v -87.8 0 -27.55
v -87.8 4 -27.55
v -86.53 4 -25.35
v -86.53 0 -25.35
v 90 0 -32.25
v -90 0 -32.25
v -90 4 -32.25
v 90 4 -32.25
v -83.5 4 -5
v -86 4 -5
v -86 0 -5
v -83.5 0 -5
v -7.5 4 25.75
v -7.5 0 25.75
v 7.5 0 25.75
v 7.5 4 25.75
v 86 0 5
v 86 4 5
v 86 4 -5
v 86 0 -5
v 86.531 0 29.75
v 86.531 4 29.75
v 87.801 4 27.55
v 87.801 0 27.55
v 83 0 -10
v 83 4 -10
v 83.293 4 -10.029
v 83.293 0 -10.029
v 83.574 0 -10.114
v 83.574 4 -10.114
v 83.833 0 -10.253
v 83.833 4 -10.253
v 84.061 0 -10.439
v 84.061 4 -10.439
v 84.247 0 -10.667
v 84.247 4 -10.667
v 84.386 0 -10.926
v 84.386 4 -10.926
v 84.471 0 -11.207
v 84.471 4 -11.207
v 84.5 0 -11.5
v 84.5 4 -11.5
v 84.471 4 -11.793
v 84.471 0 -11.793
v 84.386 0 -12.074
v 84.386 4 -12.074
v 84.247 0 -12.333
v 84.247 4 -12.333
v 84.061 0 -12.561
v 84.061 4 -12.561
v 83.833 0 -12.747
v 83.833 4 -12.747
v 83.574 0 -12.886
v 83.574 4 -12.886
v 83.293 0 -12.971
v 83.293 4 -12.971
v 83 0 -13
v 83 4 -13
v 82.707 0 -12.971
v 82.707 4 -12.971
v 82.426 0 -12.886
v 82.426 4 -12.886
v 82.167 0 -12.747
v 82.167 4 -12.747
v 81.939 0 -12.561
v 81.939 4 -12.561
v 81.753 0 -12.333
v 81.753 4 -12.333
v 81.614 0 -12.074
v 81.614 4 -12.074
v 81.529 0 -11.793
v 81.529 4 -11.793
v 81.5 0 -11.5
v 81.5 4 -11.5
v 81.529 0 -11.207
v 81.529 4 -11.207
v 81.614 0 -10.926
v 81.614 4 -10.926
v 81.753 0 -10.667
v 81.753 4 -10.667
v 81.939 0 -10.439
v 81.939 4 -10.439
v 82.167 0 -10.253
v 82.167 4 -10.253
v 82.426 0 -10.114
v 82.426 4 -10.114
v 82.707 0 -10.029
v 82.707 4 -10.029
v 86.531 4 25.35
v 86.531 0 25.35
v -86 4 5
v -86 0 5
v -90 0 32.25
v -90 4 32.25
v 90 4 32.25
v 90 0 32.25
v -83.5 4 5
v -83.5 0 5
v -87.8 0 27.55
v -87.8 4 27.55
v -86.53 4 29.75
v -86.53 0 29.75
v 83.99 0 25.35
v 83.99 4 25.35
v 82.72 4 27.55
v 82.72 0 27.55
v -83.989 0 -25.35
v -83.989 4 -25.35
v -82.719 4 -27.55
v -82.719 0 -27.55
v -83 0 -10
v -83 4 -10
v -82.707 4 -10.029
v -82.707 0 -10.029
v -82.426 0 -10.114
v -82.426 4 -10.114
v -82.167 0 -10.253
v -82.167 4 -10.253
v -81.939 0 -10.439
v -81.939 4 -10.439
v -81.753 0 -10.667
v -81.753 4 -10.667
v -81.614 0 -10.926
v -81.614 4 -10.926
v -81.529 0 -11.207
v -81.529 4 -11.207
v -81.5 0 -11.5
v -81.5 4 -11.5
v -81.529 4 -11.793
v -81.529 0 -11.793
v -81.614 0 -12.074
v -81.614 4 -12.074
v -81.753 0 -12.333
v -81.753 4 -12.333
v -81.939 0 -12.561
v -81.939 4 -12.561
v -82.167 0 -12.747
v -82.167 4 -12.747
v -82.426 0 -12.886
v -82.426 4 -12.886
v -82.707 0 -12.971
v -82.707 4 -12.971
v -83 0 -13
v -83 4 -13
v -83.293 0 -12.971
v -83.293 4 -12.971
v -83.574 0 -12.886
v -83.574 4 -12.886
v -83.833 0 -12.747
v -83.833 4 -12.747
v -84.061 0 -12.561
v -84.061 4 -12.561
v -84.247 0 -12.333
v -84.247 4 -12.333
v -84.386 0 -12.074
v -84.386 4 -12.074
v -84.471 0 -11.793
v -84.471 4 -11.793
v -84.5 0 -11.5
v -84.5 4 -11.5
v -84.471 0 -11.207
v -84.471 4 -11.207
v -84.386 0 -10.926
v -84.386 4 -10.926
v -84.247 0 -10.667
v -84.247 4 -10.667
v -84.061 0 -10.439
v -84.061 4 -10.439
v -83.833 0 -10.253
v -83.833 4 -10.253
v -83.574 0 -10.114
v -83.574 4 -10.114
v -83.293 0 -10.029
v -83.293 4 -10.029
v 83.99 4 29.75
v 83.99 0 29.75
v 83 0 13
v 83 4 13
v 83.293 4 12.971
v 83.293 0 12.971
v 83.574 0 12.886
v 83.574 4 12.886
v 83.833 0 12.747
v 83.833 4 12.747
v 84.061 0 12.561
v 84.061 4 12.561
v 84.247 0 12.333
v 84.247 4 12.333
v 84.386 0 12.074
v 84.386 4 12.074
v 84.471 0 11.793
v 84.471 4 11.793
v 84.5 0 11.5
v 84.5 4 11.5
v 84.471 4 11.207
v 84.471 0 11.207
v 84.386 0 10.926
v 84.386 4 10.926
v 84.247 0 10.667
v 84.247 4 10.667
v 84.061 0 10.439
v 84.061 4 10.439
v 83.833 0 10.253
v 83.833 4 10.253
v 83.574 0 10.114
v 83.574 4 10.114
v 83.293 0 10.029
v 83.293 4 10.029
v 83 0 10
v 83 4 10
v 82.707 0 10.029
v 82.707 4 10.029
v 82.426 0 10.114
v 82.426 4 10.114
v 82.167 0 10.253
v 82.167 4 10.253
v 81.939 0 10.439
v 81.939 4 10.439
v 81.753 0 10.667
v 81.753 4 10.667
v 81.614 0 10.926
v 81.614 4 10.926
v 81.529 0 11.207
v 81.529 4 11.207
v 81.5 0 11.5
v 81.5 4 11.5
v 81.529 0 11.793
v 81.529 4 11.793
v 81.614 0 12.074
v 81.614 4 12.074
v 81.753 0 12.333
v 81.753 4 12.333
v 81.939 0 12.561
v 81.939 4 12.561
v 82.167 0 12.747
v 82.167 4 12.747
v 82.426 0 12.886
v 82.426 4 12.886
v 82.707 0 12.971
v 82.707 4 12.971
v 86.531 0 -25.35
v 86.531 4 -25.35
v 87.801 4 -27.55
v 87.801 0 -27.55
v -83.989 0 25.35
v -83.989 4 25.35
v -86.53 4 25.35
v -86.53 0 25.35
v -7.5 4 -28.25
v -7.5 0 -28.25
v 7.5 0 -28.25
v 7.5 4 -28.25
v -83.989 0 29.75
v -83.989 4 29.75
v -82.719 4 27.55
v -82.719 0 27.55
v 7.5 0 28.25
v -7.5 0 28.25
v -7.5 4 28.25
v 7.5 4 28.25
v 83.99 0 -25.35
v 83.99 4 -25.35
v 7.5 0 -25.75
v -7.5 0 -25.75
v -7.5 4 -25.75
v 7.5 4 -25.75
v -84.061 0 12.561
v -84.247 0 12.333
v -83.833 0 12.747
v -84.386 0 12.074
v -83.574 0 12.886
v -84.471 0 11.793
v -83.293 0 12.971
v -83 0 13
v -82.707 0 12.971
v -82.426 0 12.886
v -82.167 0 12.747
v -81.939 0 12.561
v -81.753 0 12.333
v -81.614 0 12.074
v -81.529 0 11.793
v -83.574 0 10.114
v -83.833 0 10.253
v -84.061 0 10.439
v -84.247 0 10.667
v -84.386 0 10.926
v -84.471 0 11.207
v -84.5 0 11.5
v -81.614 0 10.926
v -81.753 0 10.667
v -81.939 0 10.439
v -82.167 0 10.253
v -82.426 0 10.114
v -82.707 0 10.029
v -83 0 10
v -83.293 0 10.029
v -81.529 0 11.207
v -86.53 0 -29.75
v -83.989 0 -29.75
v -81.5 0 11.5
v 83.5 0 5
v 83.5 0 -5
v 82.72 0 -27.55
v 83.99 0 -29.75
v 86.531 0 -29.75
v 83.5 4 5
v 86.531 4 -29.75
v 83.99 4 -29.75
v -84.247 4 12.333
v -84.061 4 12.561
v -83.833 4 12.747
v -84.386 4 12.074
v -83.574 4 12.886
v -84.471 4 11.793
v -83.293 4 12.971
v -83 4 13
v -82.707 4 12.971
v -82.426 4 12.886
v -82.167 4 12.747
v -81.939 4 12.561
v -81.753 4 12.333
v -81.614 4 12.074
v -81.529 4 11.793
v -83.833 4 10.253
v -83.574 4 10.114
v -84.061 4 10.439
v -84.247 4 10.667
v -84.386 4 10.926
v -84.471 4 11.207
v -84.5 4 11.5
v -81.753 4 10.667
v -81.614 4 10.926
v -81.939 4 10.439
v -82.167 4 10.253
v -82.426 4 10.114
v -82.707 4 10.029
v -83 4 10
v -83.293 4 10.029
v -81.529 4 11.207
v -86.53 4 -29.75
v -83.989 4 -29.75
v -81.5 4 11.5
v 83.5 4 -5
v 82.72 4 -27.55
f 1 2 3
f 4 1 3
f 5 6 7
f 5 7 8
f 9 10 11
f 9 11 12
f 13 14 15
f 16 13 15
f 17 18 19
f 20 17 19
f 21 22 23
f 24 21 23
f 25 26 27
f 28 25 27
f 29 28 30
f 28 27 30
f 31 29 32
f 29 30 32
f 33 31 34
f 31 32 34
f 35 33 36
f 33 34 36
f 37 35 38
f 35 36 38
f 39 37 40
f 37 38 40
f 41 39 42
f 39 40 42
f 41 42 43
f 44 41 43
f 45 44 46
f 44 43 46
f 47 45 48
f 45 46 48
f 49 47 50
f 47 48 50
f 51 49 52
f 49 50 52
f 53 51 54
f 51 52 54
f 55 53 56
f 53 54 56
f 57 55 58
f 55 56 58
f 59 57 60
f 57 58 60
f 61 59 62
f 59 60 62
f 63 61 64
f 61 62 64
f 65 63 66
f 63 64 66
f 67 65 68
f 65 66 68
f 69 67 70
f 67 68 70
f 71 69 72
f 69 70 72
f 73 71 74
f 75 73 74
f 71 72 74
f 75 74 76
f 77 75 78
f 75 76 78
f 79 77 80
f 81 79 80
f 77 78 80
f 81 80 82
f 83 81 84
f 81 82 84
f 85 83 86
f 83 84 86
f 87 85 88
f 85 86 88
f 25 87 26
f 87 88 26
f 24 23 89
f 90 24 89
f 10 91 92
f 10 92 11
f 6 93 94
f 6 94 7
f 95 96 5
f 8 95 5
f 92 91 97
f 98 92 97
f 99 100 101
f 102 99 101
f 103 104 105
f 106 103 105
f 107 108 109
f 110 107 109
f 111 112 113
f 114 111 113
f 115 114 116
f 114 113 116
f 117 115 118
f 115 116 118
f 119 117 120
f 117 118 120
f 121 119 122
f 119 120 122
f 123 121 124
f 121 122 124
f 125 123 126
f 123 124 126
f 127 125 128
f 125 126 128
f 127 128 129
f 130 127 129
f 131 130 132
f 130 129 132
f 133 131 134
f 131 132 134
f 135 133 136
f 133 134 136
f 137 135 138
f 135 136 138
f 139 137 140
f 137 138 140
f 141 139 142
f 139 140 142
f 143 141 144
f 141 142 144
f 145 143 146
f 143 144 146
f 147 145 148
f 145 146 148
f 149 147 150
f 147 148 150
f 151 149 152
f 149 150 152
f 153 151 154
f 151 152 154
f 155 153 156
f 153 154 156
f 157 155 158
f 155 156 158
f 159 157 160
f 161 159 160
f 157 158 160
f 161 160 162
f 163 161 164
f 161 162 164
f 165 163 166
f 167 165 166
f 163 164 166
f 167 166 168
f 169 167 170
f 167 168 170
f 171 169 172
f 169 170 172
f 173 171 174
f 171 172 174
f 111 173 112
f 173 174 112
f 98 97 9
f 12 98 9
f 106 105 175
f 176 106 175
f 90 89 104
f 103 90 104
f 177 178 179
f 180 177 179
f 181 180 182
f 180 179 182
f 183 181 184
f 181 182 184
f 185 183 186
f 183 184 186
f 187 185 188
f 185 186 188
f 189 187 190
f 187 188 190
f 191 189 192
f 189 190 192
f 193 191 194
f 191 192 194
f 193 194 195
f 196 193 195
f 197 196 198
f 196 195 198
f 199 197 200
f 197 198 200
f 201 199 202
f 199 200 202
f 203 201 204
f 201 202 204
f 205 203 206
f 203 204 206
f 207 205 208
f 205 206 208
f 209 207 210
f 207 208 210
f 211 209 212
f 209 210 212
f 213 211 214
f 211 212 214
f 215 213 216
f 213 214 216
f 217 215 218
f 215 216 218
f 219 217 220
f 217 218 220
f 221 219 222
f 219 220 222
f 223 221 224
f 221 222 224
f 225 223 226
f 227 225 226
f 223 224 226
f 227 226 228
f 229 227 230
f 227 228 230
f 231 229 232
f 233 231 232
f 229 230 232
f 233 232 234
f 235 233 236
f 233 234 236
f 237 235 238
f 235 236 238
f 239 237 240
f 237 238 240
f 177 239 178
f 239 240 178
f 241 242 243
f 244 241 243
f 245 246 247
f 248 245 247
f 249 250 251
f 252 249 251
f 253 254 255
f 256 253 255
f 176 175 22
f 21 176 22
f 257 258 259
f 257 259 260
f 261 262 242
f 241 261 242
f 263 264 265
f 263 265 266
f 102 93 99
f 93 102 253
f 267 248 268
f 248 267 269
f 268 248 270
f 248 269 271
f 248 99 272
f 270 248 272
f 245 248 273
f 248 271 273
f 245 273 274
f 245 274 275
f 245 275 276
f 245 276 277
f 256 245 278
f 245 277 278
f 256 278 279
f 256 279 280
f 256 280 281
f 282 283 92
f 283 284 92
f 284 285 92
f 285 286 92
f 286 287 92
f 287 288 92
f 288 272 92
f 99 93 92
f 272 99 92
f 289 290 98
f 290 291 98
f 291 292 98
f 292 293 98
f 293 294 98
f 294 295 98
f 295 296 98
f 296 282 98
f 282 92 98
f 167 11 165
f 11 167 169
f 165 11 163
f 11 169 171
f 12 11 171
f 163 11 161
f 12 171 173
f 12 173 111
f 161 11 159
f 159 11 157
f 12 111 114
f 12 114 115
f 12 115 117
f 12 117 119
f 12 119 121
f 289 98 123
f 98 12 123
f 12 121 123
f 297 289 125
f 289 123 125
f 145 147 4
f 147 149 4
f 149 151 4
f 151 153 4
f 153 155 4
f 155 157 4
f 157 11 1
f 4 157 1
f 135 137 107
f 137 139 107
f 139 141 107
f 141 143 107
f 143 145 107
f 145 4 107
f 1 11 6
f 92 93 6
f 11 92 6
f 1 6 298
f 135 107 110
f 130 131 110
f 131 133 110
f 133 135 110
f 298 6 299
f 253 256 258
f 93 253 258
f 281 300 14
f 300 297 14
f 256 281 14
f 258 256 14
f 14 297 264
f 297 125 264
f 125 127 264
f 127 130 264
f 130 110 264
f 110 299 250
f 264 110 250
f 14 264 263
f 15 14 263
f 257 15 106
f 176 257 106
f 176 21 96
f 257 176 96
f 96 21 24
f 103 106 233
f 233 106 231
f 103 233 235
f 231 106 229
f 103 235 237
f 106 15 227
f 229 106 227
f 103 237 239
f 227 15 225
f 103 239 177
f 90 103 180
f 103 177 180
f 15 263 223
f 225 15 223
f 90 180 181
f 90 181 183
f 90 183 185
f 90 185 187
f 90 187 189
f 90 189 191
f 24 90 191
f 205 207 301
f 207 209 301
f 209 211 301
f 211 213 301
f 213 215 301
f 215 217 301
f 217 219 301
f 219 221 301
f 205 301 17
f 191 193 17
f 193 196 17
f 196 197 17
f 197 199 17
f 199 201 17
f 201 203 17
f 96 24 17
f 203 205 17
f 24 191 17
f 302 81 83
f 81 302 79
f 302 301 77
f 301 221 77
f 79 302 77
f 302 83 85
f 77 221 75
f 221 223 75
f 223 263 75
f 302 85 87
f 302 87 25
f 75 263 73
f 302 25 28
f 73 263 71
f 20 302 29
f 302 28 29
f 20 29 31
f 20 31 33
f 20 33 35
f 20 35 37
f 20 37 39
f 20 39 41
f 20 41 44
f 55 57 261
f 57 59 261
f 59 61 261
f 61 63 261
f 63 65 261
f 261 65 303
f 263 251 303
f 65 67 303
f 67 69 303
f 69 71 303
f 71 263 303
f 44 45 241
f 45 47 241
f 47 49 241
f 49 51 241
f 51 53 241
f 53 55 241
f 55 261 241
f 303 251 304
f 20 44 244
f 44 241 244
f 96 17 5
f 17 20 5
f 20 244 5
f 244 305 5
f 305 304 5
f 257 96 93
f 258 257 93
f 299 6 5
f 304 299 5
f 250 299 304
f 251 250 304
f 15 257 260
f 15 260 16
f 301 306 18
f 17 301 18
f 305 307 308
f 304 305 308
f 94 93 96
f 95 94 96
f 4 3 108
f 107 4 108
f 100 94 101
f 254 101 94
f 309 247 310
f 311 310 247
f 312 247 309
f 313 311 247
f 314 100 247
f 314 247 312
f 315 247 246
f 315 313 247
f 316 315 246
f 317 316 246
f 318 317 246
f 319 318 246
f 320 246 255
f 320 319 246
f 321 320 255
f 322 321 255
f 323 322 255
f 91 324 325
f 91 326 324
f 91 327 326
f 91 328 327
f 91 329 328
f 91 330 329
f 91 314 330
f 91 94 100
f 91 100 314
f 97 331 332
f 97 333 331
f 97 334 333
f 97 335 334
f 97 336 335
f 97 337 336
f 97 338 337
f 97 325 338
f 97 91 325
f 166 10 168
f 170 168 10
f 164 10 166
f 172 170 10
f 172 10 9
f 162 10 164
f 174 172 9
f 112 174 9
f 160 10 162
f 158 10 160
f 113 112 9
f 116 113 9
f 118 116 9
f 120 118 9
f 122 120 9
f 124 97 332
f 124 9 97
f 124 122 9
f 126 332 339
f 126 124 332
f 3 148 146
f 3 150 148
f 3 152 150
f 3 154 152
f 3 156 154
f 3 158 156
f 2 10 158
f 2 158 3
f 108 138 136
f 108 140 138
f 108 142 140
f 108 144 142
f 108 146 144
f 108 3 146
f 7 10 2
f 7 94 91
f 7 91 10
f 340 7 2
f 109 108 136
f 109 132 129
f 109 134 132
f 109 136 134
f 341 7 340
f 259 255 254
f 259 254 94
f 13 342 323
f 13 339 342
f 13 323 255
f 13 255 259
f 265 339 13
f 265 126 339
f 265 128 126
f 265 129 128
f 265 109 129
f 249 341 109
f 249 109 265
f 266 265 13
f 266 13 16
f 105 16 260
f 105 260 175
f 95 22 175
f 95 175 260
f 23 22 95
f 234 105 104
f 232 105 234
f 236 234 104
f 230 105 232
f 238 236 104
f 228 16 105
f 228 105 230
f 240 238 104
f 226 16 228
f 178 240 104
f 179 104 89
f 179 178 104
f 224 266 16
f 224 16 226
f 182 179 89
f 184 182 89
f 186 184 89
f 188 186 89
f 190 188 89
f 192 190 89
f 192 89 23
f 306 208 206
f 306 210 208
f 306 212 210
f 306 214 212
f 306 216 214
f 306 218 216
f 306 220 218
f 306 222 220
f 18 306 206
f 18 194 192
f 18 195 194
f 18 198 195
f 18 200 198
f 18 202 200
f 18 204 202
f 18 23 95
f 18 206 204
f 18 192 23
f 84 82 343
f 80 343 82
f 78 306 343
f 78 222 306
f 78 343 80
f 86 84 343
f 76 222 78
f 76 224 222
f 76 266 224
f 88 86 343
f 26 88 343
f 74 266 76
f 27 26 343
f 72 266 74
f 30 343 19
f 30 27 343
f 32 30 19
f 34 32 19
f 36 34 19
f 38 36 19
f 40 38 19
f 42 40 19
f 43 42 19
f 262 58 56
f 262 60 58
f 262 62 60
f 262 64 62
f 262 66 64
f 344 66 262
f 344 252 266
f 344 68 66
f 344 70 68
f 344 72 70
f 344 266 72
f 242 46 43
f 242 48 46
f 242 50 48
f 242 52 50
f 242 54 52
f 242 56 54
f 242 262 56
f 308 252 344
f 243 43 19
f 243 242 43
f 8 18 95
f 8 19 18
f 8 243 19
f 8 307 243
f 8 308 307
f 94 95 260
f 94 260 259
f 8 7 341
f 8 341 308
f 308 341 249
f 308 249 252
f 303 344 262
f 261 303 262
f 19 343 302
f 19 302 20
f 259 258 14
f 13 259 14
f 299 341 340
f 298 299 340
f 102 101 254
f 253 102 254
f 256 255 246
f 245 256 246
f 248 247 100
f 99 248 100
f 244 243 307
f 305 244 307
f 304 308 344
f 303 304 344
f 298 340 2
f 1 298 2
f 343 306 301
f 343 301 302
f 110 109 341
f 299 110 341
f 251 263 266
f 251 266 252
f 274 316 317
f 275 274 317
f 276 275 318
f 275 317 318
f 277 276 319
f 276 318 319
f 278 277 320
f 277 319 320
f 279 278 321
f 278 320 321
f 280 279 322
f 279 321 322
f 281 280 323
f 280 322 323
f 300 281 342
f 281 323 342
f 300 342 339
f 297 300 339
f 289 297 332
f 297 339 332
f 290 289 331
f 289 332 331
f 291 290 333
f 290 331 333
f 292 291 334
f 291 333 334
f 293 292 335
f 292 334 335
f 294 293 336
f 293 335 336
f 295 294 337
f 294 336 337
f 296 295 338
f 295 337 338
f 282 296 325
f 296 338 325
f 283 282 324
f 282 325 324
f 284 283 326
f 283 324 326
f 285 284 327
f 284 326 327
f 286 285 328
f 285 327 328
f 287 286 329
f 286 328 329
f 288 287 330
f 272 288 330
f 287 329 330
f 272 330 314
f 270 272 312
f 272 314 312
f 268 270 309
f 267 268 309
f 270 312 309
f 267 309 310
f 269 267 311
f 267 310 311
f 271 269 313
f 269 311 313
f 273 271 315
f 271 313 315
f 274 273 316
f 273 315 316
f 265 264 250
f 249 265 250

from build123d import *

# Parameters (mm, degrees)
CROQUIS1_W              = 180
CROQUIS1_H              = 64.5
SALIENTE_EXTRUIR1_DEPTH = 4
CROQUIS2_W              = 2.5
CROQUIS2_H              = 10
CORTAR_EXTRUIR1_DEPTH   = 4
MATRIZL1_COUNT          = 2
MATRIZL1_PITCH          = 169.5
CROQUIS3_W              = 15
CROQUIS3_H              = 2.5
CORTAR_EXTRUIR2_DEPTH   = 4
CORTAR_EXTRUIR3_DEPTH   = 4
MATRIZL2_COUNT          = 2
MATRIZL2_PITCH          = 170.52
MATRIZL2_COUNT_DIR2     = 2
MATRIZL2_PITCH_DIR2     = 55.1
CROQUIS5_R              = 1.5
CORTAR_EXTRUIR4_DEPTH   = 4


with BuildPart() as part:
    # Croquis1 → Saliente-Extruir1 (new body)
    with BuildSketch(Plane(origin=(0, 0, 0), x_dir=(1, 0, 0), z_dir=(0, 1, 0))):
        Rectangle(CROQUIS1_W, CROQUIS1_H)
    extrude(amount=SALIENTE_EXTRUIR1_DEPTH)

    # Croquis2 → Cortar-Extruir1 (cut)
    with BuildSketch(Plane(origin=(0, 4, 0), x_dir=(1, 0, 0), z_dir=(0, 1, 0))):
        with Locations((84.75, 0)):
            Rectangle(CROQUIS2_W, CROQUIS2_H)
    cortar_extruir1 = extrude(amount=-CORTAR_EXTRUIR1_DEPTH, mode=Mode.SUBTRACT)

    # MatrizL1: Cortar-Extruir1 ×2
    with Locations(*[(-i * MATRIZL1_PITCH, 0, 0) for i in range(1, MATRIZL1_COUNT)]):
        add(cortar_extruir1, mode=Mode.SUBTRACT)

    # Croquis3 → Cortar-Extruir2 (cut)
    with BuildSketch(Plane(origin=(0, 0, 0), x_dir=(1, 0, 0), z_dir=(0, 1, 0))):
        with Locations((0, 27)):
            Rectangle(CROQUIS3_W, CROQUIS3_H)
        with Locations((0, -27)):
            Rectangle(CROQUIS3_W, CROQUIS3_H)
    extrude(amount=CORTAR_EXTRUIR2_DEPTH, mode=Mode.SUBTRACT)

    # Croquis4 → Cortar-Extruir3 (cut)
    with BuildSketch(Plane(origin=(0, 4, 0), x_dir=(1, 0, 0), z_dir=(0, 1, 0))):
        Polygon((-82.719317631, 27.55), (-83.989488223, 29.75), (-86.529829408, 29.75), (-87.8, 27.55), (-86.529829408, 25.35), (-83.989488223, 25.35), align=None)
    cortar_extruir3 = extrude(amount=-CORTAR_EXTRUIR3_DEPTH, mode=Mode.SUBTRACT)

    # MatrizL2: Cortar-Extruir3 2 × 2
    with Locations(*[(i * MATRIZL2_PITCH, 0, j * MATRIZL2_PITCH_DIR2) for i in range(MATRIZL2_COUNT) for j in range(MATRIZL2_COUNT_DIR2) if (i, j) != (0, 0)]):
        add(cortar_extruir3, mode=Mode.SUBTRACT)

    # Croquis5 → Cortar-Extruir4 (cut)
    with BuildSketch(Plane(origin=(0, 4, 0), x_dir=(1, 0, 0), z_dir=(0, 1, 0))):
        with Locations(Location((-83, 11.5, 0), (0, 0, 270))):
            Circle(CROQUIS5_R)
        with Locations(Location((-83, -11.5, 0), (0, 0, 270))):
            Circle(CROQUIS5_R)
        with Locations(Location((83, -11.5, 0), (0, 0, 270))):
            Circle(CROQUIS5_R)
        with Locations(Location((83, 11.5, 0), (0, 0, 270))):
            Circle(CROQUIS5_R)
    extrude(amount=-CORTAR_EXTRUIR4_DEPTH, mode=Mode.SUBTRACT)


solid = part.part
